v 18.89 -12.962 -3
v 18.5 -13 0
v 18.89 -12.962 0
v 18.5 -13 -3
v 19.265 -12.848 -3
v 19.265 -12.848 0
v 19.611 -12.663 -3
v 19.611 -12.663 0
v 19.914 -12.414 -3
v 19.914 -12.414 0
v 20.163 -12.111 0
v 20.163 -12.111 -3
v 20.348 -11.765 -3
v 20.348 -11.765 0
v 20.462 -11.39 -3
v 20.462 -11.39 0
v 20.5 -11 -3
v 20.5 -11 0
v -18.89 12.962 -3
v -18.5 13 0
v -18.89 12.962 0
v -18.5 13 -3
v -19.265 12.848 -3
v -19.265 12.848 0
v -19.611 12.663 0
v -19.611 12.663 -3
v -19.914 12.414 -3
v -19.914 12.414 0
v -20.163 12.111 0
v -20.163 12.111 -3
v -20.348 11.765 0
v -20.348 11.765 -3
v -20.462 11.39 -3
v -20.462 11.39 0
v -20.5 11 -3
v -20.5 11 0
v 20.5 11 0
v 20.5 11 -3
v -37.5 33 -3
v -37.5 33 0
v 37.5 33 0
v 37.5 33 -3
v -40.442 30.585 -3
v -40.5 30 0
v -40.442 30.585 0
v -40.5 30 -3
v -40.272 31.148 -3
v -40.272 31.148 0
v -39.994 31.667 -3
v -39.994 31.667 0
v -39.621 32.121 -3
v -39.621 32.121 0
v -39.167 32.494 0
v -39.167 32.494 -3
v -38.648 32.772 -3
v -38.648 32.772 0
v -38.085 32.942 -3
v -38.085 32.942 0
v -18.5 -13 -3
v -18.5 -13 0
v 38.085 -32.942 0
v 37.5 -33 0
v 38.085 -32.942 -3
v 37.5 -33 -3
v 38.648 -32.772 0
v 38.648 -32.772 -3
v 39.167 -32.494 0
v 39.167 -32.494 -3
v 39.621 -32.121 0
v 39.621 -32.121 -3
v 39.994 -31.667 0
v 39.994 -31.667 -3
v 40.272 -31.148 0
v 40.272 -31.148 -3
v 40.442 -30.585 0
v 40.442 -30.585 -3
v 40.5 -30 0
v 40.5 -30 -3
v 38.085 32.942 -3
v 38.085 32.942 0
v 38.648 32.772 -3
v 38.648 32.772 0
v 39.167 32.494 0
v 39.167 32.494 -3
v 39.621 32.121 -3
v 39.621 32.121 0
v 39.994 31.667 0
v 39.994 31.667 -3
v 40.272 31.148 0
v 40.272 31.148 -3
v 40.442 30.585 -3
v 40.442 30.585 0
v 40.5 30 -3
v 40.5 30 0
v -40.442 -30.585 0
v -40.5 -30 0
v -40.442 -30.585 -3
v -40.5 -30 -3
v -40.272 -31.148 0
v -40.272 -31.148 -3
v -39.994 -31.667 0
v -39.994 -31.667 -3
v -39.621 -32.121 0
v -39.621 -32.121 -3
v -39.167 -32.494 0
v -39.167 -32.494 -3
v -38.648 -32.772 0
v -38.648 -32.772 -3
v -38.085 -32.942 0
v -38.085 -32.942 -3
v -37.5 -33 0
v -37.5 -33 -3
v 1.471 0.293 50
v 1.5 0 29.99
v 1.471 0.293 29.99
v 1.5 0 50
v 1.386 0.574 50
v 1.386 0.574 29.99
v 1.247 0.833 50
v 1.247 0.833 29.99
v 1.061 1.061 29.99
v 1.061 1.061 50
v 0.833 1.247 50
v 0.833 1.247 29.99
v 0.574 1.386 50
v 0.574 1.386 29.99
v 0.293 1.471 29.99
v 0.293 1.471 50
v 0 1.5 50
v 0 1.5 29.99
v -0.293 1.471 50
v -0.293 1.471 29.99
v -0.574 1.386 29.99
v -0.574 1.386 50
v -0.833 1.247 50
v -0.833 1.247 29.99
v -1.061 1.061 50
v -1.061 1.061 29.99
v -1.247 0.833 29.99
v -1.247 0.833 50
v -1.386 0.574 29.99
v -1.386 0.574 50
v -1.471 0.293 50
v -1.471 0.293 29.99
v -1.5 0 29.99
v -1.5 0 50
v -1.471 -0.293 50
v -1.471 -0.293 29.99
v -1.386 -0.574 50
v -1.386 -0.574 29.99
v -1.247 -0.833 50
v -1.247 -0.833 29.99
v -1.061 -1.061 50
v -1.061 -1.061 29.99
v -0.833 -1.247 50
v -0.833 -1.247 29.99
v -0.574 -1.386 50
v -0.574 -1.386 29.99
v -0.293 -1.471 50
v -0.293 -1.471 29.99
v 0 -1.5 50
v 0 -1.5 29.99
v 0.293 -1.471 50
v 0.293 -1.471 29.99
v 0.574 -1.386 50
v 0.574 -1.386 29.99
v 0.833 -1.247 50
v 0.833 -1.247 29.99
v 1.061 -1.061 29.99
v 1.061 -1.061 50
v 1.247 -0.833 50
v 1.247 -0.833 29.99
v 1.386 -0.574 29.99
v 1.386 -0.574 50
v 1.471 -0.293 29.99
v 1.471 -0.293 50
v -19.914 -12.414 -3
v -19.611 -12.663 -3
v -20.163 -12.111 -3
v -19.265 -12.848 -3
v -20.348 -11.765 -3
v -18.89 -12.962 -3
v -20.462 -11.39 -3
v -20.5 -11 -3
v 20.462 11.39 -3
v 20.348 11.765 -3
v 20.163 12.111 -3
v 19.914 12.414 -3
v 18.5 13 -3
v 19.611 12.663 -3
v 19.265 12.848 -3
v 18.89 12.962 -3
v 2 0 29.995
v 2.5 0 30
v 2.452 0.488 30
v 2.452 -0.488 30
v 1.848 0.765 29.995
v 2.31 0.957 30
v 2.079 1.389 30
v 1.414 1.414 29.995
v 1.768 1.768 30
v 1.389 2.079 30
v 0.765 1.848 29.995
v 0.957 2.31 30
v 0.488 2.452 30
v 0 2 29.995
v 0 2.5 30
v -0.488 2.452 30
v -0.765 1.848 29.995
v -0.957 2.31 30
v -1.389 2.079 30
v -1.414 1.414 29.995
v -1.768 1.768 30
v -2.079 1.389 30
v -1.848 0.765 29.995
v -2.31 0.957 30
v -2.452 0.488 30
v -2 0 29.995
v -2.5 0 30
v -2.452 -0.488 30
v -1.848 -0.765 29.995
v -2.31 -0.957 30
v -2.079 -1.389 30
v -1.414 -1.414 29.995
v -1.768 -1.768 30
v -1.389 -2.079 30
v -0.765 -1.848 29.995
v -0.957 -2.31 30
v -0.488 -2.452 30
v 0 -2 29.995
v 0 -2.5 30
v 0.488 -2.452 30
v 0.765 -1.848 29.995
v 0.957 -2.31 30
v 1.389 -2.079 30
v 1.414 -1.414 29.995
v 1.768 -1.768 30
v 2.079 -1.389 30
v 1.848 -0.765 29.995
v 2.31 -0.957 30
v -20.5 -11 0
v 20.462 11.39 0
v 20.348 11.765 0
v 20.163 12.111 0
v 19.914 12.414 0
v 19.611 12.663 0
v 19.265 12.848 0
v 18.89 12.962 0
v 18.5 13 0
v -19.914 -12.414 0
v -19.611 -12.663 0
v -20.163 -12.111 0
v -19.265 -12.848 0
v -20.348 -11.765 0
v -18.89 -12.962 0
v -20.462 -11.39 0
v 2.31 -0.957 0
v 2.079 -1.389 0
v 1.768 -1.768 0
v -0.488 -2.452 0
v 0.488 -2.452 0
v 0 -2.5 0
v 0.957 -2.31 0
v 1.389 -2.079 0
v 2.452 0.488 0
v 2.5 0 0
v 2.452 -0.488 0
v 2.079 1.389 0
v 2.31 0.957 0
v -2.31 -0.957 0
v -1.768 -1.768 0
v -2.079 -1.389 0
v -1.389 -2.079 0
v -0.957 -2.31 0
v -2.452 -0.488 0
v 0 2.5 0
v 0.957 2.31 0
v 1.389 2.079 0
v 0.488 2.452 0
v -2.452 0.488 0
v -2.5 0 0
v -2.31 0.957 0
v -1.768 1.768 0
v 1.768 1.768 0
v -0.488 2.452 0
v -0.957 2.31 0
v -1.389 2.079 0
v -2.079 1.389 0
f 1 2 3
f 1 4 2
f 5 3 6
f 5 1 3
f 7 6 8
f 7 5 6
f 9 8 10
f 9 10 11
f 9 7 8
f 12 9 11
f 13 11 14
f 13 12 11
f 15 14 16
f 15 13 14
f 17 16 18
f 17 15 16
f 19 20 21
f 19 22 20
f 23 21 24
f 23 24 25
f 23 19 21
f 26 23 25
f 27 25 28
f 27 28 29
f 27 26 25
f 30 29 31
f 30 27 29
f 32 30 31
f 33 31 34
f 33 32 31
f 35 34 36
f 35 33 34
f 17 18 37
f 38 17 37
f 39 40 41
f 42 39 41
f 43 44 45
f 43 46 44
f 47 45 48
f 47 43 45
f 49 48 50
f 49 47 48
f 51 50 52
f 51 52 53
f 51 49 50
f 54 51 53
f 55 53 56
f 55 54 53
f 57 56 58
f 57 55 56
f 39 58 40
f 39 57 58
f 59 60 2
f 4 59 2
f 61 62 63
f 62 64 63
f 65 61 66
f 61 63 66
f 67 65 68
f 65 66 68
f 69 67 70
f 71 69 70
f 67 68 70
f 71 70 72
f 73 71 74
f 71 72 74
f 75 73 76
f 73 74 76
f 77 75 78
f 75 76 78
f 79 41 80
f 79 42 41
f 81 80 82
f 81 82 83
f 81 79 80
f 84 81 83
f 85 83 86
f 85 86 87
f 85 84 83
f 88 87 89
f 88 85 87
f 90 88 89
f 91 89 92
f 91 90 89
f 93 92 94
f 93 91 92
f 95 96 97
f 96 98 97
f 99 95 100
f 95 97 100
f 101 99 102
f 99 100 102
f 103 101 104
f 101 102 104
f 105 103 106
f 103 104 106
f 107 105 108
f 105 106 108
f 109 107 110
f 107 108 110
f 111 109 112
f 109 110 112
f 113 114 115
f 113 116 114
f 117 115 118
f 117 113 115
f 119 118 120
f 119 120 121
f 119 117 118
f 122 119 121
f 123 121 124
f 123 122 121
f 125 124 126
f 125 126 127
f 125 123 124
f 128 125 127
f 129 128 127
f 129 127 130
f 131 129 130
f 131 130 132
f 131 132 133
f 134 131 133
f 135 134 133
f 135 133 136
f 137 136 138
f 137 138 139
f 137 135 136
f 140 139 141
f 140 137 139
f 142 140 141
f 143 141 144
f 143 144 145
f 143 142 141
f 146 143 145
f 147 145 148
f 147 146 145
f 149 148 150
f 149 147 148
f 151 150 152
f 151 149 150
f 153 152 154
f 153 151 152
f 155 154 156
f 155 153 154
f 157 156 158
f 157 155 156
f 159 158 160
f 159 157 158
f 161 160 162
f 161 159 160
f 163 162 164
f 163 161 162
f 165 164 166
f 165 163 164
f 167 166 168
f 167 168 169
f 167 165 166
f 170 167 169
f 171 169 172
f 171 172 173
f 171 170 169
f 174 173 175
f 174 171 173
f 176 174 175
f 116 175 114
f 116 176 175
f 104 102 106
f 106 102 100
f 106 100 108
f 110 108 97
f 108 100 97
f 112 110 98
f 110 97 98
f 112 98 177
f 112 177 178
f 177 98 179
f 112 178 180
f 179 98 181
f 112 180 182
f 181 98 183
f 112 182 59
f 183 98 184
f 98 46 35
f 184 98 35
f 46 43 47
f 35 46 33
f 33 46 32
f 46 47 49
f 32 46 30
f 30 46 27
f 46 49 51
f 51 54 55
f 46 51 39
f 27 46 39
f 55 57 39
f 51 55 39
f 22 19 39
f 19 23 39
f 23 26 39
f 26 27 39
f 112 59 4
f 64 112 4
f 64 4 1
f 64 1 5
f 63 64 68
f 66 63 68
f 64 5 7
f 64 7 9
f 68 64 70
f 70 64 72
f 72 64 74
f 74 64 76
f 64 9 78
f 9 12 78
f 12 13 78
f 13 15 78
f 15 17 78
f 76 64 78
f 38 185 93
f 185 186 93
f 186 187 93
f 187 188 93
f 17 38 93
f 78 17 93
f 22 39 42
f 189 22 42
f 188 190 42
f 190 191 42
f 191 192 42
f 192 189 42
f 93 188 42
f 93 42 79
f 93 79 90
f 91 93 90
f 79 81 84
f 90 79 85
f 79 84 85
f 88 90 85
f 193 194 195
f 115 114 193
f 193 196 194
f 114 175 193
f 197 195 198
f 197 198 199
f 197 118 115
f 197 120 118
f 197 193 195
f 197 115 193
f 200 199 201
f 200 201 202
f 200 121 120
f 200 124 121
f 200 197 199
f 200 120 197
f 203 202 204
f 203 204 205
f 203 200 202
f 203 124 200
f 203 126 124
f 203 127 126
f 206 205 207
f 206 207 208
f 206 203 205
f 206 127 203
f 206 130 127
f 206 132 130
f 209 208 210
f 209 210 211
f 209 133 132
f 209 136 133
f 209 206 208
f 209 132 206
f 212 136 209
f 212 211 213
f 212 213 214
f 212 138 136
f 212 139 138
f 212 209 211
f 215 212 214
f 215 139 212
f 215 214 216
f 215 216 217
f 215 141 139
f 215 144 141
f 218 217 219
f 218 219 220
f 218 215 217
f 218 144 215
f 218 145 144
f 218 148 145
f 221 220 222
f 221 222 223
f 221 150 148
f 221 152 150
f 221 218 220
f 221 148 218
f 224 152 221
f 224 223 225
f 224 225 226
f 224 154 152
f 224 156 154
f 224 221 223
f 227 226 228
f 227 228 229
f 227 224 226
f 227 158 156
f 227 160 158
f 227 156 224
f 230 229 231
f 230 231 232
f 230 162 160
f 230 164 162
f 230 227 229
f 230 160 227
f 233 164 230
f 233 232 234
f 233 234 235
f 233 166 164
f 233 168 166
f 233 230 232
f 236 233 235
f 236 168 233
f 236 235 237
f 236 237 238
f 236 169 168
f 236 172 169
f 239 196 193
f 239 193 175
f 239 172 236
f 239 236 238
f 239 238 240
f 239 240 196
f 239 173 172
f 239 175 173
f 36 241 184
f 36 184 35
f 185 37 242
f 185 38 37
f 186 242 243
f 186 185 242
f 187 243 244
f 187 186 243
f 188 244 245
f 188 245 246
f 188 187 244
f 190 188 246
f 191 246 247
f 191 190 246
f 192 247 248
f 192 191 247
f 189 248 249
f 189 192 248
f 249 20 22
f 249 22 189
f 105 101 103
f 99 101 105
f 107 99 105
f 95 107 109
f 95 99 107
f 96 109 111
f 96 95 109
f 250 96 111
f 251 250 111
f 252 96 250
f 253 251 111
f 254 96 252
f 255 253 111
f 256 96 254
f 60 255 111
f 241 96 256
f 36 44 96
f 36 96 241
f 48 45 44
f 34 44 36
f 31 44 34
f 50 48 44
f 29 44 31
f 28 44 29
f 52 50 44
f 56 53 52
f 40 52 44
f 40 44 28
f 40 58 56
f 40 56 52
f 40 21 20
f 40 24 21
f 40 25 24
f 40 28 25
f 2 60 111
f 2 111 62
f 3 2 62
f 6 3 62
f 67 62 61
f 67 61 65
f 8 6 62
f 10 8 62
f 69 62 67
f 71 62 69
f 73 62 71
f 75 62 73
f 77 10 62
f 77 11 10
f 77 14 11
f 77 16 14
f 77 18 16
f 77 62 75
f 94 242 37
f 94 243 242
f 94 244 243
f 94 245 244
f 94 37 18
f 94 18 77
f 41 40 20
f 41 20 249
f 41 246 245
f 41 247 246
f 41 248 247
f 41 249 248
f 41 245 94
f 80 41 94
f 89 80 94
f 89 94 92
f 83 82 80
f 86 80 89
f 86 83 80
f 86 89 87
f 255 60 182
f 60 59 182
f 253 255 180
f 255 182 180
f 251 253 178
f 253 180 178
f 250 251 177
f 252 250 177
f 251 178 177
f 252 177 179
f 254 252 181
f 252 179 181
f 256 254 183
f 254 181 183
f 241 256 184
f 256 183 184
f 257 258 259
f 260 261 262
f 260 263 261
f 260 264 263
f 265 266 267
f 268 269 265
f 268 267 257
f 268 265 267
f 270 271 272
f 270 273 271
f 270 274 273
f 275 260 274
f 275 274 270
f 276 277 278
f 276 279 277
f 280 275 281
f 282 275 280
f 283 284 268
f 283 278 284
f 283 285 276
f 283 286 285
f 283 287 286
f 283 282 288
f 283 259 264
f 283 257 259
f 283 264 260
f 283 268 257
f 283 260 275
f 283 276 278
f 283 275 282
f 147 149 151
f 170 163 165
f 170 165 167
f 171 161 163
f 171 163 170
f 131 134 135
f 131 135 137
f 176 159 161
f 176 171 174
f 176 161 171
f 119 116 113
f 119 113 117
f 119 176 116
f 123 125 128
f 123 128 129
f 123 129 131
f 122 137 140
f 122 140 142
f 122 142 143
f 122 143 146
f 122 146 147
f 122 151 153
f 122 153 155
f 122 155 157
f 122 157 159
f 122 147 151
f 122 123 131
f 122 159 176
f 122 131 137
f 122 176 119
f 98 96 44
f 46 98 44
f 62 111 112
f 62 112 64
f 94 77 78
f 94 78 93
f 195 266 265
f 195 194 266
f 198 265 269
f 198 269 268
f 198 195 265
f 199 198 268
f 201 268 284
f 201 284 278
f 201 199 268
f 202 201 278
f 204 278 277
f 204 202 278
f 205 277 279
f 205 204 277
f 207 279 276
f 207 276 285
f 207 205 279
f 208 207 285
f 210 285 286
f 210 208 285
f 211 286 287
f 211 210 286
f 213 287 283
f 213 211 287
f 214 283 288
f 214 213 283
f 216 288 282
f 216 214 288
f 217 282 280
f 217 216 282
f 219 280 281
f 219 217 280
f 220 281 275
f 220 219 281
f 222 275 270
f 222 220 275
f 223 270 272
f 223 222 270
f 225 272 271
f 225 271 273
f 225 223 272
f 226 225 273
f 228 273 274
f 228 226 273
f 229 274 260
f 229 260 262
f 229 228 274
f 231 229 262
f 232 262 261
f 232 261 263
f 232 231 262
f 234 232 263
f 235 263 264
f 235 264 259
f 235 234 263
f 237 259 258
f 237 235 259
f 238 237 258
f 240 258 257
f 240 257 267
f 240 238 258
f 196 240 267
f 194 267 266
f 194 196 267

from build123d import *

# Parameters (mm, degrees)
SKETCH_W    = 81
SKETCH_H    = 66
SKETCH_W_2  = 41
SKETCH_H_2  = 26
PAD_DEPTH   = 3
FILLET_R    = 3
FILLET001_R = 2


with BuildPart() as body:
    # Sketch (on XY_Plane of Origin) → Pad (new body)
    with BuildSketch(Plane.XY):
        Rectangle(SKETCH_W, SKETCH_H)
        Rectangle(SKETCH_W_2, SKETCH_H_2, mode=Mode.SUBTRACT)
    extrude(amount=-PAD_DEPTH)

    # Fillet
    fillet_edges = [body.edges().sort_by_distance(p)[0] for p in [
        (40.5, -33, -1.5),
        (-40.5, -33, -1.5),
        (40.5, 33, -1.5),
        (-40.5, 33, -1.5),
    ]]
    fillet(fillet_edges, radius=FILLET_R)

    # Fillet001
    fillet001_edges = [body.edges().sort_by_distance(p)[0] for p in [
        (20.5, -13, -1.5),
        (-20.5, -13, -1.5),
        (-20.5, 13, -1.5),
        (20.5, 13, -1.5),
    ]]
    fillet(fillet001_edges, radius=FILLET001_R)


with BuildPart() as endmill003:
    # Sketch003 → Revolution (revolve)
    with BuildSketch(Plane.XZ):
        Polygon((0, 50), (0, 0), (2.5, 0), (2.5, 30), (1.5, 29.99), (1.5, 50), align=None)
    revolve(axis=Axis((0, 0, 0), (0, 0, 1)))


solid = Compound([body.part, endmill003.part])
